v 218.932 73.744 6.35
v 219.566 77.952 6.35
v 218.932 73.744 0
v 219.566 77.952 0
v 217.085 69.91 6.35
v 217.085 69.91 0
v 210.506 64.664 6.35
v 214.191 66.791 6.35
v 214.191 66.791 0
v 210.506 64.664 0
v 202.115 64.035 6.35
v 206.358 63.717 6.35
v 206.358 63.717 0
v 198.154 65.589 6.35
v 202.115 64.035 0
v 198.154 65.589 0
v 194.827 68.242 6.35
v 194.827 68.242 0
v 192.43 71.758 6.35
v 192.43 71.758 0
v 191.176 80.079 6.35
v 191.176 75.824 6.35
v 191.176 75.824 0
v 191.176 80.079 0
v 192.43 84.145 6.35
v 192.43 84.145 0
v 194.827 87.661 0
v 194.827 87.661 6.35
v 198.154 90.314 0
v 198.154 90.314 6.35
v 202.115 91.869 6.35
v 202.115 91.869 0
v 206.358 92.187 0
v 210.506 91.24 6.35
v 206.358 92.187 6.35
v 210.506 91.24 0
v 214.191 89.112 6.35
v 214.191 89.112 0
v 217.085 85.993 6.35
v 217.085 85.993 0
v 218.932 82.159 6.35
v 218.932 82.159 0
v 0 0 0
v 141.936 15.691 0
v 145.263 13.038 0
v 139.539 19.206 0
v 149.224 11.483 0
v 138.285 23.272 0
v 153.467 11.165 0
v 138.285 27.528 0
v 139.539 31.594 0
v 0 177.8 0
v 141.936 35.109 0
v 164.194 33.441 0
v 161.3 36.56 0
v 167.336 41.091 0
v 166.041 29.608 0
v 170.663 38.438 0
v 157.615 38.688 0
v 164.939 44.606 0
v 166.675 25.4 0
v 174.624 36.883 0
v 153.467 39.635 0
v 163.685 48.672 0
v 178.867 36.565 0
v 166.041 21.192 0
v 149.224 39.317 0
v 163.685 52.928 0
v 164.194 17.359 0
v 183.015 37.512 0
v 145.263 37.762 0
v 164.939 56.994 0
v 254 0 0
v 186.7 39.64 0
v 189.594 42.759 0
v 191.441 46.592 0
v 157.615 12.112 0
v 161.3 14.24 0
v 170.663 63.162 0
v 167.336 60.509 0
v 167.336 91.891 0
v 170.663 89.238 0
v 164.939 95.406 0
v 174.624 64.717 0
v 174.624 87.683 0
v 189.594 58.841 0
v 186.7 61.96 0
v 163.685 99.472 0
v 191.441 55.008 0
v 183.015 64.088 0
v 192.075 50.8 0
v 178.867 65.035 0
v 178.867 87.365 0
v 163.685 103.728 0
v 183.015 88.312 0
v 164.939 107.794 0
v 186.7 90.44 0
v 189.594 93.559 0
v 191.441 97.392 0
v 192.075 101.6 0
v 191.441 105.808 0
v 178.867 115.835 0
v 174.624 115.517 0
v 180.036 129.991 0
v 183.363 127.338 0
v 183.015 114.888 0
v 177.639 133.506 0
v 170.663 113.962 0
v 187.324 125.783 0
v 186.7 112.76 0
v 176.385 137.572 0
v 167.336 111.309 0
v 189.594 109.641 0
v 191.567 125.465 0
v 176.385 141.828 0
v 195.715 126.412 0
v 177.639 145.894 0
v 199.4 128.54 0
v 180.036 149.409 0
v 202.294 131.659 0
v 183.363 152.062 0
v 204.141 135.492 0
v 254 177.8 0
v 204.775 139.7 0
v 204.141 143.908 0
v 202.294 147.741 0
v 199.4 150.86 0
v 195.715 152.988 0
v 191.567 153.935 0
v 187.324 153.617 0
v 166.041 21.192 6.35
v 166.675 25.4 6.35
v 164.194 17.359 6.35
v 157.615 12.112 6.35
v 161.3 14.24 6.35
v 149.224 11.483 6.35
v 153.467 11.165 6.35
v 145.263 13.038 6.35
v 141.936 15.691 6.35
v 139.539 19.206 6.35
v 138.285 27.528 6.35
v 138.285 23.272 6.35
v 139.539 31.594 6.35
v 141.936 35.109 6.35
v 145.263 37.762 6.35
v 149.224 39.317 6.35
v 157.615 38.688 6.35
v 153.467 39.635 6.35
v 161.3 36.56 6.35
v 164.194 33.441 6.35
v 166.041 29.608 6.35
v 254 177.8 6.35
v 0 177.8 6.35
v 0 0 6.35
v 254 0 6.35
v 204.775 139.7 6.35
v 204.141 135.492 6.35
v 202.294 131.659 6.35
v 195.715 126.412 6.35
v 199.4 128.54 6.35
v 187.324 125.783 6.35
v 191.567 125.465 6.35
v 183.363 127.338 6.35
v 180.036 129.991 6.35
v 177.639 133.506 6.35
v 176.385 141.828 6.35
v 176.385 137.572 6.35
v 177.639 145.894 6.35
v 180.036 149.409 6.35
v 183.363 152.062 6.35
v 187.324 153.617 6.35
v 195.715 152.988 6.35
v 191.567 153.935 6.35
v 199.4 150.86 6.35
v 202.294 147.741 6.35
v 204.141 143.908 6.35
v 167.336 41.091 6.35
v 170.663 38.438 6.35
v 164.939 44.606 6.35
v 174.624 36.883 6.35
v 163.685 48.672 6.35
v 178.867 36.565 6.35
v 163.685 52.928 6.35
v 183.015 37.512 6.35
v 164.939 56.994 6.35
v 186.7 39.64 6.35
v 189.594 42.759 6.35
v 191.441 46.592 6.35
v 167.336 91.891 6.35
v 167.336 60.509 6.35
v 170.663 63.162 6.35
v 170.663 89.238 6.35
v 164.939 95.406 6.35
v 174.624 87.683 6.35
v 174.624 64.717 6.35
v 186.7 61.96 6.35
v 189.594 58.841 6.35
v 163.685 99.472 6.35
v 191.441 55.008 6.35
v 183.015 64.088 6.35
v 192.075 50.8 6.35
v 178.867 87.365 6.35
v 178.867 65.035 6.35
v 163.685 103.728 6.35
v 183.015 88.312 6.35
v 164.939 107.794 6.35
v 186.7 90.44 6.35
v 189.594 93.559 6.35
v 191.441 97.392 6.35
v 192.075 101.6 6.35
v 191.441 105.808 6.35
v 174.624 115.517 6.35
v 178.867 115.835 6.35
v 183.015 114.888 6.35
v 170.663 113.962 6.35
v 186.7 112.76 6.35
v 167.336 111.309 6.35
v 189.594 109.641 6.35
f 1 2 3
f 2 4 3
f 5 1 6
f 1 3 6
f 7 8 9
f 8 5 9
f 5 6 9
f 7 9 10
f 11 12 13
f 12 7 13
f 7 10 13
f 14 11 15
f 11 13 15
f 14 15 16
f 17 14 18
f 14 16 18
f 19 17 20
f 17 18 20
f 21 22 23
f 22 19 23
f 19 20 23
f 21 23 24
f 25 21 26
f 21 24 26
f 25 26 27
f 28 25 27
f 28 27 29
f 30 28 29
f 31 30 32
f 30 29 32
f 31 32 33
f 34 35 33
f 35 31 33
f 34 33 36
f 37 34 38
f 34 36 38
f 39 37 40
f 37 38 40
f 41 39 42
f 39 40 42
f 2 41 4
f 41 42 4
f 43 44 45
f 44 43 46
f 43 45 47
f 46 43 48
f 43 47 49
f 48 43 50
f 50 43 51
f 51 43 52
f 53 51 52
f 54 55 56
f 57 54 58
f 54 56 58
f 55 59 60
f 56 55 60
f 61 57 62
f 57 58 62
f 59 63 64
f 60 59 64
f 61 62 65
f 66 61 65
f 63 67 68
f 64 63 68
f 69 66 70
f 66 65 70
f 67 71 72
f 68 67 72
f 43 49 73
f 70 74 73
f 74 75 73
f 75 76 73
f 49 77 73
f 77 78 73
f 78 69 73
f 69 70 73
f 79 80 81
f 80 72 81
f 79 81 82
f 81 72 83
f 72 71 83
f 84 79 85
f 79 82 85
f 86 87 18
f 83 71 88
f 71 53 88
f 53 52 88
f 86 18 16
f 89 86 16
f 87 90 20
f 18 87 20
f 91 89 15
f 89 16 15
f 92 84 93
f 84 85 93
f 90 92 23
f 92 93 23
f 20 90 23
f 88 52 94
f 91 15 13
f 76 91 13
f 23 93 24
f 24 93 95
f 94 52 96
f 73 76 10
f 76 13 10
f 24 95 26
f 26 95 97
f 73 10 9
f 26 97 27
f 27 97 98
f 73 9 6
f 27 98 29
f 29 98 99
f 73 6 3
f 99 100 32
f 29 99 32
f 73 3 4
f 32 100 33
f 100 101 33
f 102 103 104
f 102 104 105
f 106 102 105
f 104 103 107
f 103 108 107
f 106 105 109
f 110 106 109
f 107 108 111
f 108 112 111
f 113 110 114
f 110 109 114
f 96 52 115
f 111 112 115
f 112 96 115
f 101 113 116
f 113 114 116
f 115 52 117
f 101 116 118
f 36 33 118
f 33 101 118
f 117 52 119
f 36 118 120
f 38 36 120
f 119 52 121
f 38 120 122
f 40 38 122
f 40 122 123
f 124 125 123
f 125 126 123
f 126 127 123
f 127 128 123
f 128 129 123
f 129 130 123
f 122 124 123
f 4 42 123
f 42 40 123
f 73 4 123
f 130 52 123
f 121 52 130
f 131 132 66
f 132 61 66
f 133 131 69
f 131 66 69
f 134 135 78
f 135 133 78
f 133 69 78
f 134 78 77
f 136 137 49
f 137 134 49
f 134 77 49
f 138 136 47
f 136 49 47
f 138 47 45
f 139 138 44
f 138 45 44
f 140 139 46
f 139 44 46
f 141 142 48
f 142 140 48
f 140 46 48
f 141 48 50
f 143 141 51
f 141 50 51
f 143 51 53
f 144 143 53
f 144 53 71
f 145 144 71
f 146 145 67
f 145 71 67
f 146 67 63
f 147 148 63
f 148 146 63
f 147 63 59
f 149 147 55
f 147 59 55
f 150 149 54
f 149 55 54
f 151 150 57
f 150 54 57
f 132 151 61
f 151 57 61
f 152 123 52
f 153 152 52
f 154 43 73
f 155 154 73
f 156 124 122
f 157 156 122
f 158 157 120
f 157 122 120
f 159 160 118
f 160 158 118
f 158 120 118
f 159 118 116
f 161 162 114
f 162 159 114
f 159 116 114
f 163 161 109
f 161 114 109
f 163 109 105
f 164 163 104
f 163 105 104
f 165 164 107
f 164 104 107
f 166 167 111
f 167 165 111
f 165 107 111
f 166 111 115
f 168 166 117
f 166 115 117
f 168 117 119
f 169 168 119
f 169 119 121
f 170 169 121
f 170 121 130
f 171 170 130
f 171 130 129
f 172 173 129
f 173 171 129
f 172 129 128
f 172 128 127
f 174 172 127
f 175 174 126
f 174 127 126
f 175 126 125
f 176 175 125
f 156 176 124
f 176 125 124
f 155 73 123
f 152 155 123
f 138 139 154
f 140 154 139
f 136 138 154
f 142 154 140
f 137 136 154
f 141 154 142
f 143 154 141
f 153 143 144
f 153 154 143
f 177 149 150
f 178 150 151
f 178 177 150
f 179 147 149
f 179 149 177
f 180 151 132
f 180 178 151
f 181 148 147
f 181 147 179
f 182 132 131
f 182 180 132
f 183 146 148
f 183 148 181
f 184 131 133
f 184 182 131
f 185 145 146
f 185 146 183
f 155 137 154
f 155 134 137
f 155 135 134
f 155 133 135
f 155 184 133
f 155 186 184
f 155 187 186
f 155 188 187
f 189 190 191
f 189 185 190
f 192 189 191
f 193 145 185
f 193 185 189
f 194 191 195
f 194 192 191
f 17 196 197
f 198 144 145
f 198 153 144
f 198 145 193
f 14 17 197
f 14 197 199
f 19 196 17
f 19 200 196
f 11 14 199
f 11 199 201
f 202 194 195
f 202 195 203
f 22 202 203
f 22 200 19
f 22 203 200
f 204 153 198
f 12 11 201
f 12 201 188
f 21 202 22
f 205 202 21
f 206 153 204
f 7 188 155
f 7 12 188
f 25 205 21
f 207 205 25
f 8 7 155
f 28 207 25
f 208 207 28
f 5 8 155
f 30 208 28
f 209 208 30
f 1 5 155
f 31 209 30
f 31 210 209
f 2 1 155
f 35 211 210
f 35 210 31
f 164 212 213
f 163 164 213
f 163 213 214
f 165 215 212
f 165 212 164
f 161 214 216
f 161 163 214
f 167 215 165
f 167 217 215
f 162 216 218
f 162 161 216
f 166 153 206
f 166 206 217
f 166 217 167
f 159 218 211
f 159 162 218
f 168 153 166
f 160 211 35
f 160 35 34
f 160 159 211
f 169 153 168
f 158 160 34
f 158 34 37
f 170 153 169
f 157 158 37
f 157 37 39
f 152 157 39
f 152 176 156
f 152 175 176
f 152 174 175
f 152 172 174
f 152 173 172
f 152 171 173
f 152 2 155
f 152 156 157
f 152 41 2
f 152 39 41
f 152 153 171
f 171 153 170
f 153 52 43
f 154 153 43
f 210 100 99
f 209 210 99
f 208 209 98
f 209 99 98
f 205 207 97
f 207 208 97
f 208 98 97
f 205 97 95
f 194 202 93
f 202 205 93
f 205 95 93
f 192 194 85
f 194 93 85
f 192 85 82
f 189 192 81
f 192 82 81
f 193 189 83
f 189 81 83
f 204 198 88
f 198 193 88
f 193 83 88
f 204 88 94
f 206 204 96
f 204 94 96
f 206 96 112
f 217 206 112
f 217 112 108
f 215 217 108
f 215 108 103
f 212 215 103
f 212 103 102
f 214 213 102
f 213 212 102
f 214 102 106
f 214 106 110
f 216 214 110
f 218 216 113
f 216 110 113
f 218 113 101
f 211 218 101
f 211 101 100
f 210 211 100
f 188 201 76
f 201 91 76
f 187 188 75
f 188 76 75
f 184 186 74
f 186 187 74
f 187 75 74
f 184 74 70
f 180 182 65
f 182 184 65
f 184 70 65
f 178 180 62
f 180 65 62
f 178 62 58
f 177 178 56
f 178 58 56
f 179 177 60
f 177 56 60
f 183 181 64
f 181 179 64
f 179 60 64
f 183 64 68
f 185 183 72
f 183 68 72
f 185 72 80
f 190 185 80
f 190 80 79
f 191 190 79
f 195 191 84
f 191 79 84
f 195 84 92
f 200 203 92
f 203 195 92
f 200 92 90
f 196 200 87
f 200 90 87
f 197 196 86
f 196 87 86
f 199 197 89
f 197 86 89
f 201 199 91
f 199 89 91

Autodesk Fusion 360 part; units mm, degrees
sketch "Sketch1" plane through (0, 0, 0) normal (0, 0, 1) x (1, 0, 0)
  line L0 (0, 0) -> (254, 0)
  line L1 (254, 0) -> (254, 177.8)
  line L2 (254, 177.8) -> (0, 177.8)
  line L3 (0, 177.8) -> (0, 0)
  circle A0 centre (177.8, 50.8) radius 14.2748
  circle A1 centre (205.2911, 77.9517) radius 14.2748
  circle A2 centre (177.8, 101.6) radius 14.2748
  circle A3 centre (152.4, 25.4) radius 14.2748
  circle A4 centre (190.5, 139.7) radius 14.2748
  dimension "d1" = 254
  dimension "d2" = 177.8
  dimension "d3" = 28.5496
  dimension "d4" = 177.8
  dimension "d5" = 50.8
  dimension "d6" = 28.5496
  dimension "d7" = 28.5496
  dimension "d8" = 28.5496
  dimension "d9" = 28.5496
extrude "Extrude1" add sketch "Sketch1" along normal blind 6.35
